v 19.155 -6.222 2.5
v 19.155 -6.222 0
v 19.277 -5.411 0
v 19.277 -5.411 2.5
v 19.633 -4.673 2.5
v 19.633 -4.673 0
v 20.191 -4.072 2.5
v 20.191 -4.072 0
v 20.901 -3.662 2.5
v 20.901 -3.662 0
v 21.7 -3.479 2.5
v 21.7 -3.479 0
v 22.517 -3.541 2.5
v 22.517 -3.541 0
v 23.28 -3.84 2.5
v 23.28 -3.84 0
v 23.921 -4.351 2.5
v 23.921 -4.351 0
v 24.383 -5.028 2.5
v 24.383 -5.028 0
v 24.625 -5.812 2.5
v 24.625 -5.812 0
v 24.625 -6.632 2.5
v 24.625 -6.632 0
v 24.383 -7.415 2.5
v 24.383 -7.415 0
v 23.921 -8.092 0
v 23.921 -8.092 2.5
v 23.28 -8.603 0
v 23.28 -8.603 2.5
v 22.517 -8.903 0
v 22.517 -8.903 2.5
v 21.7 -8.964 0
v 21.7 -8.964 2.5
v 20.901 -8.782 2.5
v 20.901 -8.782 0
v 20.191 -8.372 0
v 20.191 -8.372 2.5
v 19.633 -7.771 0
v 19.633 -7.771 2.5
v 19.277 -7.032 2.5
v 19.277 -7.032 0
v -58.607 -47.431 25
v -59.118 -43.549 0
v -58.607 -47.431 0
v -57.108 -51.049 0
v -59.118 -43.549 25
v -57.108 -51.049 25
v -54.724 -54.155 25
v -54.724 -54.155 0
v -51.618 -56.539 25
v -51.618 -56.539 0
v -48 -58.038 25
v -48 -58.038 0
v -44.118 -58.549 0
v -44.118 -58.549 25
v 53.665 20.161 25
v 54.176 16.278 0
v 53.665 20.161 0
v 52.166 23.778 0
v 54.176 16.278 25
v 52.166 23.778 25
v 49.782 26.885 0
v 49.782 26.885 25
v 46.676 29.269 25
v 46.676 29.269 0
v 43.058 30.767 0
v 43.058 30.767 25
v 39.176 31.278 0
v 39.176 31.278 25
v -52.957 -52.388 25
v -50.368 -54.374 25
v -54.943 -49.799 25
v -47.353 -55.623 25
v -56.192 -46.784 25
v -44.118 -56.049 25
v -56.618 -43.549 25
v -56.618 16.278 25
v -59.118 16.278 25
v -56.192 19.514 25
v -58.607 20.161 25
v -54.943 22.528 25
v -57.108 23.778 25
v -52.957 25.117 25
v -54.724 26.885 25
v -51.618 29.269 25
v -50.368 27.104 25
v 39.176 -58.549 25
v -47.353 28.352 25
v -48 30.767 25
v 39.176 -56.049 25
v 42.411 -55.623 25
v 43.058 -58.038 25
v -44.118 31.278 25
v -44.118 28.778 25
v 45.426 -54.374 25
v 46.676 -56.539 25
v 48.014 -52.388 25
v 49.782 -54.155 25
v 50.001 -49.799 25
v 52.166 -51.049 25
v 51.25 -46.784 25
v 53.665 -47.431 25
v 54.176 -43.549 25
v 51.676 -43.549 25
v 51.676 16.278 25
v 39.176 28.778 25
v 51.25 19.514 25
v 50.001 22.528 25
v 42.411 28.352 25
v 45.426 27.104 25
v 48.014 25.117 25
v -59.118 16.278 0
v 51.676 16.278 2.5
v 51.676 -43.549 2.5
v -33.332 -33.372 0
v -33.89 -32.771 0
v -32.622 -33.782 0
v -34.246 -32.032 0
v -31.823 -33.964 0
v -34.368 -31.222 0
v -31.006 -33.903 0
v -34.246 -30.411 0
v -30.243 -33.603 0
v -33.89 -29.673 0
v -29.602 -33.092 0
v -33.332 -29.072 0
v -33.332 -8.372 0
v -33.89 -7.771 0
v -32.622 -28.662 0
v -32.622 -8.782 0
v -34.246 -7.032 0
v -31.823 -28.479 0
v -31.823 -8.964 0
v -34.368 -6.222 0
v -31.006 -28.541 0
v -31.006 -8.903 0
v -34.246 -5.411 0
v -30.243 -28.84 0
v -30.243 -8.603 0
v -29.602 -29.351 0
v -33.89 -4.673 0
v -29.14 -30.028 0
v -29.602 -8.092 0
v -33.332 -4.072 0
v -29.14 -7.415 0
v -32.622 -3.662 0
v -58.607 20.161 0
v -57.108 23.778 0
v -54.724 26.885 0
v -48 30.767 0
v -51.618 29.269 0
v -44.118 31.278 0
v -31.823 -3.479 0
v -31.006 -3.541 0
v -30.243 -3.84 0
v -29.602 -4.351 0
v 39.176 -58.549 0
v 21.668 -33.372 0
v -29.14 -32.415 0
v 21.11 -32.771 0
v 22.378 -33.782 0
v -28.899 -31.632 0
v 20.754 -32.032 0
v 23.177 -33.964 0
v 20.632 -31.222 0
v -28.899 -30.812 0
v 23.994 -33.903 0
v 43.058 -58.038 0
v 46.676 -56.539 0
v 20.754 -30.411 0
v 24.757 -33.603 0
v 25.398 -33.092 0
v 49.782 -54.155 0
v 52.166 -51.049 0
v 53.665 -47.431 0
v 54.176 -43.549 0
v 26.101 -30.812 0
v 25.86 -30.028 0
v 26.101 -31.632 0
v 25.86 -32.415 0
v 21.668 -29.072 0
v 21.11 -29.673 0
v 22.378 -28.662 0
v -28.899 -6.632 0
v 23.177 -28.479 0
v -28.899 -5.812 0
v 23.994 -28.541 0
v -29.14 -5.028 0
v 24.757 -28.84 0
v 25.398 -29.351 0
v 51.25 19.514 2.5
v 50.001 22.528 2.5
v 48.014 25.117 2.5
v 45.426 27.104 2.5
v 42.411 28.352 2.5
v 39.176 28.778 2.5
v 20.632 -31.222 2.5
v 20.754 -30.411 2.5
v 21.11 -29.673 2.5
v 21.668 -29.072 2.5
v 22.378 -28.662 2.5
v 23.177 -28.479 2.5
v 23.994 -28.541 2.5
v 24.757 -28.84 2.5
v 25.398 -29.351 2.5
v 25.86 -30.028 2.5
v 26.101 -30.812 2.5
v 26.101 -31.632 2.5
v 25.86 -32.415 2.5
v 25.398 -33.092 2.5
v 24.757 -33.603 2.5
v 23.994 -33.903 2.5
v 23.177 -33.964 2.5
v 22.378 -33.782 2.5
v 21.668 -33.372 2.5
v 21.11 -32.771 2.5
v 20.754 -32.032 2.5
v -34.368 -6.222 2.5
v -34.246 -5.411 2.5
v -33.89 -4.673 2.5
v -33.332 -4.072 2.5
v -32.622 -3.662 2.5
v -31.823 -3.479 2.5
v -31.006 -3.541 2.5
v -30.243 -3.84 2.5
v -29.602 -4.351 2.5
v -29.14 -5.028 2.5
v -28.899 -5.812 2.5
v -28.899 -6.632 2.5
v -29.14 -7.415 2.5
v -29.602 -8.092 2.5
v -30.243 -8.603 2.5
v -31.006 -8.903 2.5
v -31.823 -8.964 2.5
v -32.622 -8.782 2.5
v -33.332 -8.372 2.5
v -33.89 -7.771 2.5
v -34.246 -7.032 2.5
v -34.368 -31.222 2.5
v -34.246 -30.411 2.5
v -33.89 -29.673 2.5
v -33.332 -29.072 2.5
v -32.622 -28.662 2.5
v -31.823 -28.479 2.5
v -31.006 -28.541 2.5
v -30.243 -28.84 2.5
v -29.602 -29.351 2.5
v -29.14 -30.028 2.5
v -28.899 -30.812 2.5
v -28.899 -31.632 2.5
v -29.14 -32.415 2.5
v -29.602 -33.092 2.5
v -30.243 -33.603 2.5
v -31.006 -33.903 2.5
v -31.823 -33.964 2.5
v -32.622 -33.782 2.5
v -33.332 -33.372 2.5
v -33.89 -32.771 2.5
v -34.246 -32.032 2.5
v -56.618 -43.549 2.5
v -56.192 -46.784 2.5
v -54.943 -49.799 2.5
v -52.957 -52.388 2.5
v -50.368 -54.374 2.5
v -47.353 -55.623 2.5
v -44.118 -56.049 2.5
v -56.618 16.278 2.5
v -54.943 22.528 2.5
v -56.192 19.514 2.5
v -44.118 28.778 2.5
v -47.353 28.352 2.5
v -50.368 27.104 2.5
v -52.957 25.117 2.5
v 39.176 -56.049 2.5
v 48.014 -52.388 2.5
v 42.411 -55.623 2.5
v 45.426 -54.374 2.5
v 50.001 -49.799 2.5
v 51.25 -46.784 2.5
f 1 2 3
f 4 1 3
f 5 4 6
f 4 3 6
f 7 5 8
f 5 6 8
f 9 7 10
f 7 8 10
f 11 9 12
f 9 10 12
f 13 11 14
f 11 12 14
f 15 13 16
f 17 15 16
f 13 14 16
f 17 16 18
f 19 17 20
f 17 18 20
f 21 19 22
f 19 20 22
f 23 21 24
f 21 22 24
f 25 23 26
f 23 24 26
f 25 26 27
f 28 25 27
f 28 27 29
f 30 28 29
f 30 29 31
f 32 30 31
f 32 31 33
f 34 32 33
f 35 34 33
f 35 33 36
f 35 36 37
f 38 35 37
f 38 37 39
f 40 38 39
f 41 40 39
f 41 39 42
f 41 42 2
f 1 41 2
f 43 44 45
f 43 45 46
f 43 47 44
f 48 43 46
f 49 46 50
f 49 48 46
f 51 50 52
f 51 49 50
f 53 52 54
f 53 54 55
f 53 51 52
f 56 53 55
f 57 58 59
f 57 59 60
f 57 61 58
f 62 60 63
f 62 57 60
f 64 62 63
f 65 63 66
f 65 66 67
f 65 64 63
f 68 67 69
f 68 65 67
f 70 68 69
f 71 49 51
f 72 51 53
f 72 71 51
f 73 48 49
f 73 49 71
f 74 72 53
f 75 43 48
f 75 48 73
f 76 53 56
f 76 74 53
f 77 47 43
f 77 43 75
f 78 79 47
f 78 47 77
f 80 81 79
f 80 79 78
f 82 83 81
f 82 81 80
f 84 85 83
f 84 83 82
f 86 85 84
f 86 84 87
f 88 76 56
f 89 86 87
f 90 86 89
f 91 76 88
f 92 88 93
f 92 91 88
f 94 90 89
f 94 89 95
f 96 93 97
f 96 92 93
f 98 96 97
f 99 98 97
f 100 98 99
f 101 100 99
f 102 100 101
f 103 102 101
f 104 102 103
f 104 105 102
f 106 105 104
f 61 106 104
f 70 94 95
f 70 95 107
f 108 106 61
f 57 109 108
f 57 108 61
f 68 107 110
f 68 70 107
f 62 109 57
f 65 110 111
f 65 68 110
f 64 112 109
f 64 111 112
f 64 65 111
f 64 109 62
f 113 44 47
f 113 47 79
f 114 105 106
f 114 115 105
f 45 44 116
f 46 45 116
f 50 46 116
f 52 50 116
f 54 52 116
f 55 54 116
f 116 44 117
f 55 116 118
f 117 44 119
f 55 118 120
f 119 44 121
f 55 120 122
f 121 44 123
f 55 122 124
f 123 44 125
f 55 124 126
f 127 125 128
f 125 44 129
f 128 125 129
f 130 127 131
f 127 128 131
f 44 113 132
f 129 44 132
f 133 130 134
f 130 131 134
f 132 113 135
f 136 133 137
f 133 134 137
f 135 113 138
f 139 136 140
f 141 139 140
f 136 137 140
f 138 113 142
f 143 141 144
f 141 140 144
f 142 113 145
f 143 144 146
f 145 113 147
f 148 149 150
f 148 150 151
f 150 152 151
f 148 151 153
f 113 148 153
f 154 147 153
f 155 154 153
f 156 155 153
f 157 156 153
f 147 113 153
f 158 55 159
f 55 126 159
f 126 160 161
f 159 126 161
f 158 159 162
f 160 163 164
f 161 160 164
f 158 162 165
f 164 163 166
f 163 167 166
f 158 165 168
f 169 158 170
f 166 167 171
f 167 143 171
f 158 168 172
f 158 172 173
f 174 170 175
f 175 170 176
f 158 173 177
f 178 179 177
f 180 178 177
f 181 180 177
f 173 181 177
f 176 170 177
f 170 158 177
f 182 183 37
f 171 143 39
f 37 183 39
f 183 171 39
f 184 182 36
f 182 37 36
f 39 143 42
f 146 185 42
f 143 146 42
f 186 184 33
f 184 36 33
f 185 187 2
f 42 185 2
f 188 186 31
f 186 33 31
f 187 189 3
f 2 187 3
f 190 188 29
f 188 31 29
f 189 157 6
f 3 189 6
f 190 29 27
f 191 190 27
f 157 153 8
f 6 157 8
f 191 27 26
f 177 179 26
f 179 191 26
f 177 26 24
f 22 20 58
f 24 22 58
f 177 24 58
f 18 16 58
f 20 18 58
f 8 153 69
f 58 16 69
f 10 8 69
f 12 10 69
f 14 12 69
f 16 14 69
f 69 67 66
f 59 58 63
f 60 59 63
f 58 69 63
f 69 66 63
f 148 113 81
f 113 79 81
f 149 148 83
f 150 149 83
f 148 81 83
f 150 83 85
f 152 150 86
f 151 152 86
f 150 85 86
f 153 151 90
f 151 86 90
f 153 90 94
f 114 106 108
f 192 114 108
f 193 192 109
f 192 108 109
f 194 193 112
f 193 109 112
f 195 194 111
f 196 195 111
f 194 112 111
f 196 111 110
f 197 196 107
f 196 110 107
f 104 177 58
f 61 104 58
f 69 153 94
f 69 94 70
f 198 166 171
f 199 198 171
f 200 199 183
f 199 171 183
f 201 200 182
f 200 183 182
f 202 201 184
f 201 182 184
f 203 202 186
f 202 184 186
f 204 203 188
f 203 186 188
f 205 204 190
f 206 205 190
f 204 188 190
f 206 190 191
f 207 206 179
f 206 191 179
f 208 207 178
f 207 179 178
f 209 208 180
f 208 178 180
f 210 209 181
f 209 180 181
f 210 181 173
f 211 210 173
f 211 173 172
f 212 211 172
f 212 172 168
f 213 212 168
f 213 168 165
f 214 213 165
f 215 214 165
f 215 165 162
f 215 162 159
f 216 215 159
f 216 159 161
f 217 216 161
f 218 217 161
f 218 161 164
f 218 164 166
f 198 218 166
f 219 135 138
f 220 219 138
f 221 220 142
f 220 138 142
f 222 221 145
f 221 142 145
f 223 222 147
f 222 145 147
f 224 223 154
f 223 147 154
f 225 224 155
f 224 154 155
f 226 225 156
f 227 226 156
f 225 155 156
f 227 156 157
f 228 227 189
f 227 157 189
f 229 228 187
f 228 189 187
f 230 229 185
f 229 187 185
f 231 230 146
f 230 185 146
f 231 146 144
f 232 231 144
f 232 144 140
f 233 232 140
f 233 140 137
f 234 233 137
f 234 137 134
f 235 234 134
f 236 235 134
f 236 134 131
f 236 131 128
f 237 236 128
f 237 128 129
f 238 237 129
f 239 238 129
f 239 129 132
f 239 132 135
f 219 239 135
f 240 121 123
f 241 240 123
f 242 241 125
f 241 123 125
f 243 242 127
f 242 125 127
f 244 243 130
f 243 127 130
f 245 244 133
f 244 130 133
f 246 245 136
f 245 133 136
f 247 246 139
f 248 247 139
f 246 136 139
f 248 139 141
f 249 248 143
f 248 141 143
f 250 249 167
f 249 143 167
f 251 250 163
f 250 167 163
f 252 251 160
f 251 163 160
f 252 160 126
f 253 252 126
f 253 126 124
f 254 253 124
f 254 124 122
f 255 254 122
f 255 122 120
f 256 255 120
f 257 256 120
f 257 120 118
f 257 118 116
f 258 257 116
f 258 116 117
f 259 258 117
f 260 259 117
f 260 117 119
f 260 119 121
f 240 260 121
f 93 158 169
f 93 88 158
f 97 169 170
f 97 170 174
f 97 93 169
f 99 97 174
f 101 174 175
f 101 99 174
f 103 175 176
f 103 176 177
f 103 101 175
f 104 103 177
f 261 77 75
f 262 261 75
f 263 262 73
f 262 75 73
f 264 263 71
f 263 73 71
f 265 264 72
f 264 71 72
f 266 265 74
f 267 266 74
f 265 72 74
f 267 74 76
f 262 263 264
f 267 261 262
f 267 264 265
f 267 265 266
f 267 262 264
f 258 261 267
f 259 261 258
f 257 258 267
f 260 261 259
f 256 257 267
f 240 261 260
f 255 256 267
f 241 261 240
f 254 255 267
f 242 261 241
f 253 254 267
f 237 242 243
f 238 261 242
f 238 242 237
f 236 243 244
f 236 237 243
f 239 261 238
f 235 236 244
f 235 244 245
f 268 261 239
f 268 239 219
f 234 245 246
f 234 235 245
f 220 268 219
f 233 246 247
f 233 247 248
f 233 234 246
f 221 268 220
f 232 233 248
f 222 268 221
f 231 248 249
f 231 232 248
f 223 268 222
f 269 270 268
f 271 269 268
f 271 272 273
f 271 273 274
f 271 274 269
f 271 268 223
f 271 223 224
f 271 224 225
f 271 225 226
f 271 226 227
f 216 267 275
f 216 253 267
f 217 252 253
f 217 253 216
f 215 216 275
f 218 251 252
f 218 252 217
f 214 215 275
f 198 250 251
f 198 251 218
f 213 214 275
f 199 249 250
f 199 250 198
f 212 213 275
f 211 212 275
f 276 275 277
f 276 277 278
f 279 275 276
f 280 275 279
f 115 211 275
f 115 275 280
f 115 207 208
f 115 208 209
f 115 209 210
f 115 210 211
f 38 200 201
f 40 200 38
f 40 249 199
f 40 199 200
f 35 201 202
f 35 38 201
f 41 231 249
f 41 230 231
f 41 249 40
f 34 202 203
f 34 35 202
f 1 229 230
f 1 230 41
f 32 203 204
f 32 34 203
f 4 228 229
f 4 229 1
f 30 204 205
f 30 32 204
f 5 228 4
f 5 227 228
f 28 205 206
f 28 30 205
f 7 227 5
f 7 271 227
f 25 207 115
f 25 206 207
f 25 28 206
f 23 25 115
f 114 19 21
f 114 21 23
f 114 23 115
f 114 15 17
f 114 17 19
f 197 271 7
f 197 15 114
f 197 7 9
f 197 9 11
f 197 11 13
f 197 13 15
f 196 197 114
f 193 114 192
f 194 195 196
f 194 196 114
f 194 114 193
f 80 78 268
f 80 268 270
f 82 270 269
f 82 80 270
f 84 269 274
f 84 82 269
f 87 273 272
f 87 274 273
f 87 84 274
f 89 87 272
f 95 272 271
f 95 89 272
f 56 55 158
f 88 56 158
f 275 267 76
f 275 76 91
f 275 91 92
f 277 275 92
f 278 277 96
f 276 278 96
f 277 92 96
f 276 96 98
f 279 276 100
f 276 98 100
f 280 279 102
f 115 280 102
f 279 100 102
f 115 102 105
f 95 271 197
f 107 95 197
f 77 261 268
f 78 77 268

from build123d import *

# Parameters (mm, degrees)
F0_W     = 113.2934466004
F0_H     = 89.8272059858
F1_DEPTH = 25
F2_R     = 15
F3_T     = -2.5
F5_D     = 5.5


with BuildPart() as f1:
    # F0 (on Top) → F1 (new body)
    with BuildSketch(Plane.XY):
        with Locations((-2.4710707366, -13.6352684349)):
            Rectangle(F0_W, F0_H)
    extrude(amount=F1_DEPTH)

    # F2
    f2_edges = [f1.edges().sort_by_distance(p)[0] for p in [
        (-59.117794, -58.548871, 12.5),
        (54.175653, -58.548871, 12.5),
        (54.175653, 31.278335, 12.5),
        (-59.117794, 31.278335, 12.5),
    ]]
    fillet(f2_edges, radius=F2_R)

    # F3
    f3_openings = [f1.faces().sort_by_distance(p)[0] for p in [
        (-2.471071, -13.635268, 25),
    ]]
    offset(amount=F3_T, openings=f3_openings)

    # F5 (through all)
    with Locations(Plane.XY.offset(2.5)):
        with Locations((-31.6177940369, -6.221665442), (-31.6177940369, -31.221665442), (21.9052377621, -6.221665442), (23.3822059631, -31.221665442)):
            Hole(F5_D / 2)


solid = f1.part
